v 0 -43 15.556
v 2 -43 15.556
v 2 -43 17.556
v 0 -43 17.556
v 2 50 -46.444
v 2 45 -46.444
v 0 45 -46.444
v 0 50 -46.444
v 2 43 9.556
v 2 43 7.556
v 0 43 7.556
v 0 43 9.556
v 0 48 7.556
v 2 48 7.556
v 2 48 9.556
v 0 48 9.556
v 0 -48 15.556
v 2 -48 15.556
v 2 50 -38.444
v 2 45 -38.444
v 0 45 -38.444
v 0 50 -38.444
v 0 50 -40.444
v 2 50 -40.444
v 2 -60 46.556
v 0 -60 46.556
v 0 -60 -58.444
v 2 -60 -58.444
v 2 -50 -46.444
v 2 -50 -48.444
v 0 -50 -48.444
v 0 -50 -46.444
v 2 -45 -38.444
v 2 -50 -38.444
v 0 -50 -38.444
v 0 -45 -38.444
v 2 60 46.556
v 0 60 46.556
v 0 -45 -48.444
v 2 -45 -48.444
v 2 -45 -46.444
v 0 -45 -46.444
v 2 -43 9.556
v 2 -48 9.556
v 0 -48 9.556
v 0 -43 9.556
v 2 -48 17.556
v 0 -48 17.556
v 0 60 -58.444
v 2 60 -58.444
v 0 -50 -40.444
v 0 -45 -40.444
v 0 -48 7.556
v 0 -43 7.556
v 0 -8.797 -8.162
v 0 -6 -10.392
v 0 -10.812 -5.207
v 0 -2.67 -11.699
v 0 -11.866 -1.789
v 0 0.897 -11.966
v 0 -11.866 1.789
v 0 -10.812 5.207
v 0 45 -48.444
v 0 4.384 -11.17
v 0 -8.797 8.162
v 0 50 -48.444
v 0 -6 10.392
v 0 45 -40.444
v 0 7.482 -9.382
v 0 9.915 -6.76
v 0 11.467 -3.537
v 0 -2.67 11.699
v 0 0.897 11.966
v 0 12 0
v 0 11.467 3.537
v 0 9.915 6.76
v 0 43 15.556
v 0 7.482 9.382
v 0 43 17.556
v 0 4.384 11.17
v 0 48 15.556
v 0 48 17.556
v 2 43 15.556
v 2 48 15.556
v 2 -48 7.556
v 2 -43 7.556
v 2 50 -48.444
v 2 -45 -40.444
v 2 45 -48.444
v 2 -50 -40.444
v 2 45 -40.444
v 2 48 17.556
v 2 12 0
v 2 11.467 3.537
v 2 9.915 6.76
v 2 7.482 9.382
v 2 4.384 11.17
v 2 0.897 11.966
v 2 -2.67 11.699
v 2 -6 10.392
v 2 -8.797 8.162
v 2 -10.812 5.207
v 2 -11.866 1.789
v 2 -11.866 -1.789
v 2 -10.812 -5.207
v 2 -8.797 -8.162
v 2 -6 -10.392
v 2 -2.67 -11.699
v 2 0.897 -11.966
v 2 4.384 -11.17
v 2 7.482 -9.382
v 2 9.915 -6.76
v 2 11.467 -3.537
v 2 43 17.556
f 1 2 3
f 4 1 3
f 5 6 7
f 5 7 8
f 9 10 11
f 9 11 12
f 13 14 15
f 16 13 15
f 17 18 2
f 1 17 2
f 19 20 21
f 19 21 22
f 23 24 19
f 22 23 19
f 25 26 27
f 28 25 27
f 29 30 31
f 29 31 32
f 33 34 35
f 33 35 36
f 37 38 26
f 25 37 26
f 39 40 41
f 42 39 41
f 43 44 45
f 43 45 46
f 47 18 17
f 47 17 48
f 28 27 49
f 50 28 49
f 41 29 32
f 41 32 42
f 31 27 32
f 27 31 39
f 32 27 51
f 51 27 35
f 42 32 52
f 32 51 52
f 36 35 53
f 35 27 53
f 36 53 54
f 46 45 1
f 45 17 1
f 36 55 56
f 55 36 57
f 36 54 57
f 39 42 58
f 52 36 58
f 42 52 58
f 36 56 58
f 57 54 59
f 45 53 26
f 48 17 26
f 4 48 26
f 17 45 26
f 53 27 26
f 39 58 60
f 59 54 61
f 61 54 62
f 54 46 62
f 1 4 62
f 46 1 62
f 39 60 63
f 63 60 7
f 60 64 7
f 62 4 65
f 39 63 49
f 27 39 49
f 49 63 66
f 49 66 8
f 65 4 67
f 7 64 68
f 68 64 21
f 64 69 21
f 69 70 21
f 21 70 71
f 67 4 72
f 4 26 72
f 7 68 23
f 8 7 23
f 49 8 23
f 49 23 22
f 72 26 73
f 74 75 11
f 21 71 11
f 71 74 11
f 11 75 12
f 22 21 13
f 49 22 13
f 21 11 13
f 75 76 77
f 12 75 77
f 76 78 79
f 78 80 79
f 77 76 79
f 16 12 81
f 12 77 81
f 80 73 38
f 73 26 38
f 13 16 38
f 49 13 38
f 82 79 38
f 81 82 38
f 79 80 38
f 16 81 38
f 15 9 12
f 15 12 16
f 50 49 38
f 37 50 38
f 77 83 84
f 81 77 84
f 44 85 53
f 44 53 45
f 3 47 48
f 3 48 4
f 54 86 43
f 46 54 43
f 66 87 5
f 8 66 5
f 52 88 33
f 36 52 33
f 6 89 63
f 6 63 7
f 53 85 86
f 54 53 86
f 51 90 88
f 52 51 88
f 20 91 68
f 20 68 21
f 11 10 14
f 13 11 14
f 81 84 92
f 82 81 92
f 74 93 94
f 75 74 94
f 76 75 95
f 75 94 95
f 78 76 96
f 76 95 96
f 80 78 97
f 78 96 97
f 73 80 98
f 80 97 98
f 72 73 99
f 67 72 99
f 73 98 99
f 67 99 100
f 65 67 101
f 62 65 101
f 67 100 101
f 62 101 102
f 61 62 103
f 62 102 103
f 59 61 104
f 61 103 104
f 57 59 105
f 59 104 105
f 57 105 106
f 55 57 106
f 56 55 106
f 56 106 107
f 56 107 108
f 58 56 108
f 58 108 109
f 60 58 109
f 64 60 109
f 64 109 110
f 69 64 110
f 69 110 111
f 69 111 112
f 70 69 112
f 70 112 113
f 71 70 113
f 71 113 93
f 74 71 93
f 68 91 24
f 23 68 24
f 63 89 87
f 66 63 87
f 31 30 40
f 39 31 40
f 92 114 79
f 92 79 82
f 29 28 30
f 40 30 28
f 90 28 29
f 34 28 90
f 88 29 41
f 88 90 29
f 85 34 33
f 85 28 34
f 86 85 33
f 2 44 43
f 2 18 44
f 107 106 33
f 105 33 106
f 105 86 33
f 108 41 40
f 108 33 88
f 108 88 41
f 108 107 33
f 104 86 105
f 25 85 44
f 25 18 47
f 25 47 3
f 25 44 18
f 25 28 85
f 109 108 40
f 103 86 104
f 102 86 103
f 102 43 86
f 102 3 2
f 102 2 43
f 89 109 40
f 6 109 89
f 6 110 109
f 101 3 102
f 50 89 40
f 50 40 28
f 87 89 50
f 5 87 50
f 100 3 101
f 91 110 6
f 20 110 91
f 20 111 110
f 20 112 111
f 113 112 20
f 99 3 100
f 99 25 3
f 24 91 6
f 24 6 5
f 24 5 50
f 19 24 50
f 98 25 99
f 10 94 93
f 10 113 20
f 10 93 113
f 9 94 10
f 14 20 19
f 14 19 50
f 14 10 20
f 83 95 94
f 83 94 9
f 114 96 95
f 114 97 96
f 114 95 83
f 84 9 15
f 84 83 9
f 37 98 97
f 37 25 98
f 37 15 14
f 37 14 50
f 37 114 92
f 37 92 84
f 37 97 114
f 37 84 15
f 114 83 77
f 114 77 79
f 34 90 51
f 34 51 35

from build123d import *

# Parameters (mm, degrees)
F1_DEPTH = 2
F2_W     = 5
F2_H     = 2
F3_DEPTH = 25
F4_W     = 5
F4_H     = 2
F5_DEPTH = 25
F6_R     = 12
F7_DEPTH = 25


with BuildPart() as f1:
    # F0 (on Right) → F1 (new body)
    with BuildSketch(Plane.YZ):
        Polygon((60, 46.556178), (0, 46.556178), (-60, 46.556178), (-60, -58.443822), (0, -58.443822), (60, -58.443822), align=None)
    extrude(amount=F1_DEPTH)

    # F2 (on face) → F3 (cut)
    with BuildSketch(Plane.YZ.offset(2)):
        with Locations((-47.5, -47.443822)):
            Rectangle(F2_W, F2_H)
        with Locations((47.5, -47.443822)):
            Rectangle(F2_W, F2_H)
        with Locations((-47.5, -39.443822)):
            Rectangle(F2_W, F2_H)
        with Locations((47.5, -39.443822)):
            Rectangle(F2_W, F2_H)
    extrude(amount=-F3_DEPTH, mode=Mode.SUBTRACT)

    # F4 (on face) → F5 (cut)
    with BuildSketch(Plane.YZ.offset(2)):
        with Locations((-45.5, 8.556178)):
            Rectangle(F4_W, F4_H)
        with Locations((-45.5, 16.556178)):
            Rectangle(F4_W, F4_H)
        with Locations((45.5, 8.556178)):
            Rectangle(F4_W, F4_H)
        with Locations((45.5, 16.556178)):
            Rectangle(F4_W, F4_H)
    extrude(amount=-F5_DEPTH, mode=Mode.SUBTRACT)

    # F6 (on face) → F7 (cut)
    with BuildSketch(Plane.YZ.offset(2)):
        Circle(F6_R)
    extrude(amount=-F7_DEPTH, mode=Mode.SUBTRACT)


solid = f1.part
